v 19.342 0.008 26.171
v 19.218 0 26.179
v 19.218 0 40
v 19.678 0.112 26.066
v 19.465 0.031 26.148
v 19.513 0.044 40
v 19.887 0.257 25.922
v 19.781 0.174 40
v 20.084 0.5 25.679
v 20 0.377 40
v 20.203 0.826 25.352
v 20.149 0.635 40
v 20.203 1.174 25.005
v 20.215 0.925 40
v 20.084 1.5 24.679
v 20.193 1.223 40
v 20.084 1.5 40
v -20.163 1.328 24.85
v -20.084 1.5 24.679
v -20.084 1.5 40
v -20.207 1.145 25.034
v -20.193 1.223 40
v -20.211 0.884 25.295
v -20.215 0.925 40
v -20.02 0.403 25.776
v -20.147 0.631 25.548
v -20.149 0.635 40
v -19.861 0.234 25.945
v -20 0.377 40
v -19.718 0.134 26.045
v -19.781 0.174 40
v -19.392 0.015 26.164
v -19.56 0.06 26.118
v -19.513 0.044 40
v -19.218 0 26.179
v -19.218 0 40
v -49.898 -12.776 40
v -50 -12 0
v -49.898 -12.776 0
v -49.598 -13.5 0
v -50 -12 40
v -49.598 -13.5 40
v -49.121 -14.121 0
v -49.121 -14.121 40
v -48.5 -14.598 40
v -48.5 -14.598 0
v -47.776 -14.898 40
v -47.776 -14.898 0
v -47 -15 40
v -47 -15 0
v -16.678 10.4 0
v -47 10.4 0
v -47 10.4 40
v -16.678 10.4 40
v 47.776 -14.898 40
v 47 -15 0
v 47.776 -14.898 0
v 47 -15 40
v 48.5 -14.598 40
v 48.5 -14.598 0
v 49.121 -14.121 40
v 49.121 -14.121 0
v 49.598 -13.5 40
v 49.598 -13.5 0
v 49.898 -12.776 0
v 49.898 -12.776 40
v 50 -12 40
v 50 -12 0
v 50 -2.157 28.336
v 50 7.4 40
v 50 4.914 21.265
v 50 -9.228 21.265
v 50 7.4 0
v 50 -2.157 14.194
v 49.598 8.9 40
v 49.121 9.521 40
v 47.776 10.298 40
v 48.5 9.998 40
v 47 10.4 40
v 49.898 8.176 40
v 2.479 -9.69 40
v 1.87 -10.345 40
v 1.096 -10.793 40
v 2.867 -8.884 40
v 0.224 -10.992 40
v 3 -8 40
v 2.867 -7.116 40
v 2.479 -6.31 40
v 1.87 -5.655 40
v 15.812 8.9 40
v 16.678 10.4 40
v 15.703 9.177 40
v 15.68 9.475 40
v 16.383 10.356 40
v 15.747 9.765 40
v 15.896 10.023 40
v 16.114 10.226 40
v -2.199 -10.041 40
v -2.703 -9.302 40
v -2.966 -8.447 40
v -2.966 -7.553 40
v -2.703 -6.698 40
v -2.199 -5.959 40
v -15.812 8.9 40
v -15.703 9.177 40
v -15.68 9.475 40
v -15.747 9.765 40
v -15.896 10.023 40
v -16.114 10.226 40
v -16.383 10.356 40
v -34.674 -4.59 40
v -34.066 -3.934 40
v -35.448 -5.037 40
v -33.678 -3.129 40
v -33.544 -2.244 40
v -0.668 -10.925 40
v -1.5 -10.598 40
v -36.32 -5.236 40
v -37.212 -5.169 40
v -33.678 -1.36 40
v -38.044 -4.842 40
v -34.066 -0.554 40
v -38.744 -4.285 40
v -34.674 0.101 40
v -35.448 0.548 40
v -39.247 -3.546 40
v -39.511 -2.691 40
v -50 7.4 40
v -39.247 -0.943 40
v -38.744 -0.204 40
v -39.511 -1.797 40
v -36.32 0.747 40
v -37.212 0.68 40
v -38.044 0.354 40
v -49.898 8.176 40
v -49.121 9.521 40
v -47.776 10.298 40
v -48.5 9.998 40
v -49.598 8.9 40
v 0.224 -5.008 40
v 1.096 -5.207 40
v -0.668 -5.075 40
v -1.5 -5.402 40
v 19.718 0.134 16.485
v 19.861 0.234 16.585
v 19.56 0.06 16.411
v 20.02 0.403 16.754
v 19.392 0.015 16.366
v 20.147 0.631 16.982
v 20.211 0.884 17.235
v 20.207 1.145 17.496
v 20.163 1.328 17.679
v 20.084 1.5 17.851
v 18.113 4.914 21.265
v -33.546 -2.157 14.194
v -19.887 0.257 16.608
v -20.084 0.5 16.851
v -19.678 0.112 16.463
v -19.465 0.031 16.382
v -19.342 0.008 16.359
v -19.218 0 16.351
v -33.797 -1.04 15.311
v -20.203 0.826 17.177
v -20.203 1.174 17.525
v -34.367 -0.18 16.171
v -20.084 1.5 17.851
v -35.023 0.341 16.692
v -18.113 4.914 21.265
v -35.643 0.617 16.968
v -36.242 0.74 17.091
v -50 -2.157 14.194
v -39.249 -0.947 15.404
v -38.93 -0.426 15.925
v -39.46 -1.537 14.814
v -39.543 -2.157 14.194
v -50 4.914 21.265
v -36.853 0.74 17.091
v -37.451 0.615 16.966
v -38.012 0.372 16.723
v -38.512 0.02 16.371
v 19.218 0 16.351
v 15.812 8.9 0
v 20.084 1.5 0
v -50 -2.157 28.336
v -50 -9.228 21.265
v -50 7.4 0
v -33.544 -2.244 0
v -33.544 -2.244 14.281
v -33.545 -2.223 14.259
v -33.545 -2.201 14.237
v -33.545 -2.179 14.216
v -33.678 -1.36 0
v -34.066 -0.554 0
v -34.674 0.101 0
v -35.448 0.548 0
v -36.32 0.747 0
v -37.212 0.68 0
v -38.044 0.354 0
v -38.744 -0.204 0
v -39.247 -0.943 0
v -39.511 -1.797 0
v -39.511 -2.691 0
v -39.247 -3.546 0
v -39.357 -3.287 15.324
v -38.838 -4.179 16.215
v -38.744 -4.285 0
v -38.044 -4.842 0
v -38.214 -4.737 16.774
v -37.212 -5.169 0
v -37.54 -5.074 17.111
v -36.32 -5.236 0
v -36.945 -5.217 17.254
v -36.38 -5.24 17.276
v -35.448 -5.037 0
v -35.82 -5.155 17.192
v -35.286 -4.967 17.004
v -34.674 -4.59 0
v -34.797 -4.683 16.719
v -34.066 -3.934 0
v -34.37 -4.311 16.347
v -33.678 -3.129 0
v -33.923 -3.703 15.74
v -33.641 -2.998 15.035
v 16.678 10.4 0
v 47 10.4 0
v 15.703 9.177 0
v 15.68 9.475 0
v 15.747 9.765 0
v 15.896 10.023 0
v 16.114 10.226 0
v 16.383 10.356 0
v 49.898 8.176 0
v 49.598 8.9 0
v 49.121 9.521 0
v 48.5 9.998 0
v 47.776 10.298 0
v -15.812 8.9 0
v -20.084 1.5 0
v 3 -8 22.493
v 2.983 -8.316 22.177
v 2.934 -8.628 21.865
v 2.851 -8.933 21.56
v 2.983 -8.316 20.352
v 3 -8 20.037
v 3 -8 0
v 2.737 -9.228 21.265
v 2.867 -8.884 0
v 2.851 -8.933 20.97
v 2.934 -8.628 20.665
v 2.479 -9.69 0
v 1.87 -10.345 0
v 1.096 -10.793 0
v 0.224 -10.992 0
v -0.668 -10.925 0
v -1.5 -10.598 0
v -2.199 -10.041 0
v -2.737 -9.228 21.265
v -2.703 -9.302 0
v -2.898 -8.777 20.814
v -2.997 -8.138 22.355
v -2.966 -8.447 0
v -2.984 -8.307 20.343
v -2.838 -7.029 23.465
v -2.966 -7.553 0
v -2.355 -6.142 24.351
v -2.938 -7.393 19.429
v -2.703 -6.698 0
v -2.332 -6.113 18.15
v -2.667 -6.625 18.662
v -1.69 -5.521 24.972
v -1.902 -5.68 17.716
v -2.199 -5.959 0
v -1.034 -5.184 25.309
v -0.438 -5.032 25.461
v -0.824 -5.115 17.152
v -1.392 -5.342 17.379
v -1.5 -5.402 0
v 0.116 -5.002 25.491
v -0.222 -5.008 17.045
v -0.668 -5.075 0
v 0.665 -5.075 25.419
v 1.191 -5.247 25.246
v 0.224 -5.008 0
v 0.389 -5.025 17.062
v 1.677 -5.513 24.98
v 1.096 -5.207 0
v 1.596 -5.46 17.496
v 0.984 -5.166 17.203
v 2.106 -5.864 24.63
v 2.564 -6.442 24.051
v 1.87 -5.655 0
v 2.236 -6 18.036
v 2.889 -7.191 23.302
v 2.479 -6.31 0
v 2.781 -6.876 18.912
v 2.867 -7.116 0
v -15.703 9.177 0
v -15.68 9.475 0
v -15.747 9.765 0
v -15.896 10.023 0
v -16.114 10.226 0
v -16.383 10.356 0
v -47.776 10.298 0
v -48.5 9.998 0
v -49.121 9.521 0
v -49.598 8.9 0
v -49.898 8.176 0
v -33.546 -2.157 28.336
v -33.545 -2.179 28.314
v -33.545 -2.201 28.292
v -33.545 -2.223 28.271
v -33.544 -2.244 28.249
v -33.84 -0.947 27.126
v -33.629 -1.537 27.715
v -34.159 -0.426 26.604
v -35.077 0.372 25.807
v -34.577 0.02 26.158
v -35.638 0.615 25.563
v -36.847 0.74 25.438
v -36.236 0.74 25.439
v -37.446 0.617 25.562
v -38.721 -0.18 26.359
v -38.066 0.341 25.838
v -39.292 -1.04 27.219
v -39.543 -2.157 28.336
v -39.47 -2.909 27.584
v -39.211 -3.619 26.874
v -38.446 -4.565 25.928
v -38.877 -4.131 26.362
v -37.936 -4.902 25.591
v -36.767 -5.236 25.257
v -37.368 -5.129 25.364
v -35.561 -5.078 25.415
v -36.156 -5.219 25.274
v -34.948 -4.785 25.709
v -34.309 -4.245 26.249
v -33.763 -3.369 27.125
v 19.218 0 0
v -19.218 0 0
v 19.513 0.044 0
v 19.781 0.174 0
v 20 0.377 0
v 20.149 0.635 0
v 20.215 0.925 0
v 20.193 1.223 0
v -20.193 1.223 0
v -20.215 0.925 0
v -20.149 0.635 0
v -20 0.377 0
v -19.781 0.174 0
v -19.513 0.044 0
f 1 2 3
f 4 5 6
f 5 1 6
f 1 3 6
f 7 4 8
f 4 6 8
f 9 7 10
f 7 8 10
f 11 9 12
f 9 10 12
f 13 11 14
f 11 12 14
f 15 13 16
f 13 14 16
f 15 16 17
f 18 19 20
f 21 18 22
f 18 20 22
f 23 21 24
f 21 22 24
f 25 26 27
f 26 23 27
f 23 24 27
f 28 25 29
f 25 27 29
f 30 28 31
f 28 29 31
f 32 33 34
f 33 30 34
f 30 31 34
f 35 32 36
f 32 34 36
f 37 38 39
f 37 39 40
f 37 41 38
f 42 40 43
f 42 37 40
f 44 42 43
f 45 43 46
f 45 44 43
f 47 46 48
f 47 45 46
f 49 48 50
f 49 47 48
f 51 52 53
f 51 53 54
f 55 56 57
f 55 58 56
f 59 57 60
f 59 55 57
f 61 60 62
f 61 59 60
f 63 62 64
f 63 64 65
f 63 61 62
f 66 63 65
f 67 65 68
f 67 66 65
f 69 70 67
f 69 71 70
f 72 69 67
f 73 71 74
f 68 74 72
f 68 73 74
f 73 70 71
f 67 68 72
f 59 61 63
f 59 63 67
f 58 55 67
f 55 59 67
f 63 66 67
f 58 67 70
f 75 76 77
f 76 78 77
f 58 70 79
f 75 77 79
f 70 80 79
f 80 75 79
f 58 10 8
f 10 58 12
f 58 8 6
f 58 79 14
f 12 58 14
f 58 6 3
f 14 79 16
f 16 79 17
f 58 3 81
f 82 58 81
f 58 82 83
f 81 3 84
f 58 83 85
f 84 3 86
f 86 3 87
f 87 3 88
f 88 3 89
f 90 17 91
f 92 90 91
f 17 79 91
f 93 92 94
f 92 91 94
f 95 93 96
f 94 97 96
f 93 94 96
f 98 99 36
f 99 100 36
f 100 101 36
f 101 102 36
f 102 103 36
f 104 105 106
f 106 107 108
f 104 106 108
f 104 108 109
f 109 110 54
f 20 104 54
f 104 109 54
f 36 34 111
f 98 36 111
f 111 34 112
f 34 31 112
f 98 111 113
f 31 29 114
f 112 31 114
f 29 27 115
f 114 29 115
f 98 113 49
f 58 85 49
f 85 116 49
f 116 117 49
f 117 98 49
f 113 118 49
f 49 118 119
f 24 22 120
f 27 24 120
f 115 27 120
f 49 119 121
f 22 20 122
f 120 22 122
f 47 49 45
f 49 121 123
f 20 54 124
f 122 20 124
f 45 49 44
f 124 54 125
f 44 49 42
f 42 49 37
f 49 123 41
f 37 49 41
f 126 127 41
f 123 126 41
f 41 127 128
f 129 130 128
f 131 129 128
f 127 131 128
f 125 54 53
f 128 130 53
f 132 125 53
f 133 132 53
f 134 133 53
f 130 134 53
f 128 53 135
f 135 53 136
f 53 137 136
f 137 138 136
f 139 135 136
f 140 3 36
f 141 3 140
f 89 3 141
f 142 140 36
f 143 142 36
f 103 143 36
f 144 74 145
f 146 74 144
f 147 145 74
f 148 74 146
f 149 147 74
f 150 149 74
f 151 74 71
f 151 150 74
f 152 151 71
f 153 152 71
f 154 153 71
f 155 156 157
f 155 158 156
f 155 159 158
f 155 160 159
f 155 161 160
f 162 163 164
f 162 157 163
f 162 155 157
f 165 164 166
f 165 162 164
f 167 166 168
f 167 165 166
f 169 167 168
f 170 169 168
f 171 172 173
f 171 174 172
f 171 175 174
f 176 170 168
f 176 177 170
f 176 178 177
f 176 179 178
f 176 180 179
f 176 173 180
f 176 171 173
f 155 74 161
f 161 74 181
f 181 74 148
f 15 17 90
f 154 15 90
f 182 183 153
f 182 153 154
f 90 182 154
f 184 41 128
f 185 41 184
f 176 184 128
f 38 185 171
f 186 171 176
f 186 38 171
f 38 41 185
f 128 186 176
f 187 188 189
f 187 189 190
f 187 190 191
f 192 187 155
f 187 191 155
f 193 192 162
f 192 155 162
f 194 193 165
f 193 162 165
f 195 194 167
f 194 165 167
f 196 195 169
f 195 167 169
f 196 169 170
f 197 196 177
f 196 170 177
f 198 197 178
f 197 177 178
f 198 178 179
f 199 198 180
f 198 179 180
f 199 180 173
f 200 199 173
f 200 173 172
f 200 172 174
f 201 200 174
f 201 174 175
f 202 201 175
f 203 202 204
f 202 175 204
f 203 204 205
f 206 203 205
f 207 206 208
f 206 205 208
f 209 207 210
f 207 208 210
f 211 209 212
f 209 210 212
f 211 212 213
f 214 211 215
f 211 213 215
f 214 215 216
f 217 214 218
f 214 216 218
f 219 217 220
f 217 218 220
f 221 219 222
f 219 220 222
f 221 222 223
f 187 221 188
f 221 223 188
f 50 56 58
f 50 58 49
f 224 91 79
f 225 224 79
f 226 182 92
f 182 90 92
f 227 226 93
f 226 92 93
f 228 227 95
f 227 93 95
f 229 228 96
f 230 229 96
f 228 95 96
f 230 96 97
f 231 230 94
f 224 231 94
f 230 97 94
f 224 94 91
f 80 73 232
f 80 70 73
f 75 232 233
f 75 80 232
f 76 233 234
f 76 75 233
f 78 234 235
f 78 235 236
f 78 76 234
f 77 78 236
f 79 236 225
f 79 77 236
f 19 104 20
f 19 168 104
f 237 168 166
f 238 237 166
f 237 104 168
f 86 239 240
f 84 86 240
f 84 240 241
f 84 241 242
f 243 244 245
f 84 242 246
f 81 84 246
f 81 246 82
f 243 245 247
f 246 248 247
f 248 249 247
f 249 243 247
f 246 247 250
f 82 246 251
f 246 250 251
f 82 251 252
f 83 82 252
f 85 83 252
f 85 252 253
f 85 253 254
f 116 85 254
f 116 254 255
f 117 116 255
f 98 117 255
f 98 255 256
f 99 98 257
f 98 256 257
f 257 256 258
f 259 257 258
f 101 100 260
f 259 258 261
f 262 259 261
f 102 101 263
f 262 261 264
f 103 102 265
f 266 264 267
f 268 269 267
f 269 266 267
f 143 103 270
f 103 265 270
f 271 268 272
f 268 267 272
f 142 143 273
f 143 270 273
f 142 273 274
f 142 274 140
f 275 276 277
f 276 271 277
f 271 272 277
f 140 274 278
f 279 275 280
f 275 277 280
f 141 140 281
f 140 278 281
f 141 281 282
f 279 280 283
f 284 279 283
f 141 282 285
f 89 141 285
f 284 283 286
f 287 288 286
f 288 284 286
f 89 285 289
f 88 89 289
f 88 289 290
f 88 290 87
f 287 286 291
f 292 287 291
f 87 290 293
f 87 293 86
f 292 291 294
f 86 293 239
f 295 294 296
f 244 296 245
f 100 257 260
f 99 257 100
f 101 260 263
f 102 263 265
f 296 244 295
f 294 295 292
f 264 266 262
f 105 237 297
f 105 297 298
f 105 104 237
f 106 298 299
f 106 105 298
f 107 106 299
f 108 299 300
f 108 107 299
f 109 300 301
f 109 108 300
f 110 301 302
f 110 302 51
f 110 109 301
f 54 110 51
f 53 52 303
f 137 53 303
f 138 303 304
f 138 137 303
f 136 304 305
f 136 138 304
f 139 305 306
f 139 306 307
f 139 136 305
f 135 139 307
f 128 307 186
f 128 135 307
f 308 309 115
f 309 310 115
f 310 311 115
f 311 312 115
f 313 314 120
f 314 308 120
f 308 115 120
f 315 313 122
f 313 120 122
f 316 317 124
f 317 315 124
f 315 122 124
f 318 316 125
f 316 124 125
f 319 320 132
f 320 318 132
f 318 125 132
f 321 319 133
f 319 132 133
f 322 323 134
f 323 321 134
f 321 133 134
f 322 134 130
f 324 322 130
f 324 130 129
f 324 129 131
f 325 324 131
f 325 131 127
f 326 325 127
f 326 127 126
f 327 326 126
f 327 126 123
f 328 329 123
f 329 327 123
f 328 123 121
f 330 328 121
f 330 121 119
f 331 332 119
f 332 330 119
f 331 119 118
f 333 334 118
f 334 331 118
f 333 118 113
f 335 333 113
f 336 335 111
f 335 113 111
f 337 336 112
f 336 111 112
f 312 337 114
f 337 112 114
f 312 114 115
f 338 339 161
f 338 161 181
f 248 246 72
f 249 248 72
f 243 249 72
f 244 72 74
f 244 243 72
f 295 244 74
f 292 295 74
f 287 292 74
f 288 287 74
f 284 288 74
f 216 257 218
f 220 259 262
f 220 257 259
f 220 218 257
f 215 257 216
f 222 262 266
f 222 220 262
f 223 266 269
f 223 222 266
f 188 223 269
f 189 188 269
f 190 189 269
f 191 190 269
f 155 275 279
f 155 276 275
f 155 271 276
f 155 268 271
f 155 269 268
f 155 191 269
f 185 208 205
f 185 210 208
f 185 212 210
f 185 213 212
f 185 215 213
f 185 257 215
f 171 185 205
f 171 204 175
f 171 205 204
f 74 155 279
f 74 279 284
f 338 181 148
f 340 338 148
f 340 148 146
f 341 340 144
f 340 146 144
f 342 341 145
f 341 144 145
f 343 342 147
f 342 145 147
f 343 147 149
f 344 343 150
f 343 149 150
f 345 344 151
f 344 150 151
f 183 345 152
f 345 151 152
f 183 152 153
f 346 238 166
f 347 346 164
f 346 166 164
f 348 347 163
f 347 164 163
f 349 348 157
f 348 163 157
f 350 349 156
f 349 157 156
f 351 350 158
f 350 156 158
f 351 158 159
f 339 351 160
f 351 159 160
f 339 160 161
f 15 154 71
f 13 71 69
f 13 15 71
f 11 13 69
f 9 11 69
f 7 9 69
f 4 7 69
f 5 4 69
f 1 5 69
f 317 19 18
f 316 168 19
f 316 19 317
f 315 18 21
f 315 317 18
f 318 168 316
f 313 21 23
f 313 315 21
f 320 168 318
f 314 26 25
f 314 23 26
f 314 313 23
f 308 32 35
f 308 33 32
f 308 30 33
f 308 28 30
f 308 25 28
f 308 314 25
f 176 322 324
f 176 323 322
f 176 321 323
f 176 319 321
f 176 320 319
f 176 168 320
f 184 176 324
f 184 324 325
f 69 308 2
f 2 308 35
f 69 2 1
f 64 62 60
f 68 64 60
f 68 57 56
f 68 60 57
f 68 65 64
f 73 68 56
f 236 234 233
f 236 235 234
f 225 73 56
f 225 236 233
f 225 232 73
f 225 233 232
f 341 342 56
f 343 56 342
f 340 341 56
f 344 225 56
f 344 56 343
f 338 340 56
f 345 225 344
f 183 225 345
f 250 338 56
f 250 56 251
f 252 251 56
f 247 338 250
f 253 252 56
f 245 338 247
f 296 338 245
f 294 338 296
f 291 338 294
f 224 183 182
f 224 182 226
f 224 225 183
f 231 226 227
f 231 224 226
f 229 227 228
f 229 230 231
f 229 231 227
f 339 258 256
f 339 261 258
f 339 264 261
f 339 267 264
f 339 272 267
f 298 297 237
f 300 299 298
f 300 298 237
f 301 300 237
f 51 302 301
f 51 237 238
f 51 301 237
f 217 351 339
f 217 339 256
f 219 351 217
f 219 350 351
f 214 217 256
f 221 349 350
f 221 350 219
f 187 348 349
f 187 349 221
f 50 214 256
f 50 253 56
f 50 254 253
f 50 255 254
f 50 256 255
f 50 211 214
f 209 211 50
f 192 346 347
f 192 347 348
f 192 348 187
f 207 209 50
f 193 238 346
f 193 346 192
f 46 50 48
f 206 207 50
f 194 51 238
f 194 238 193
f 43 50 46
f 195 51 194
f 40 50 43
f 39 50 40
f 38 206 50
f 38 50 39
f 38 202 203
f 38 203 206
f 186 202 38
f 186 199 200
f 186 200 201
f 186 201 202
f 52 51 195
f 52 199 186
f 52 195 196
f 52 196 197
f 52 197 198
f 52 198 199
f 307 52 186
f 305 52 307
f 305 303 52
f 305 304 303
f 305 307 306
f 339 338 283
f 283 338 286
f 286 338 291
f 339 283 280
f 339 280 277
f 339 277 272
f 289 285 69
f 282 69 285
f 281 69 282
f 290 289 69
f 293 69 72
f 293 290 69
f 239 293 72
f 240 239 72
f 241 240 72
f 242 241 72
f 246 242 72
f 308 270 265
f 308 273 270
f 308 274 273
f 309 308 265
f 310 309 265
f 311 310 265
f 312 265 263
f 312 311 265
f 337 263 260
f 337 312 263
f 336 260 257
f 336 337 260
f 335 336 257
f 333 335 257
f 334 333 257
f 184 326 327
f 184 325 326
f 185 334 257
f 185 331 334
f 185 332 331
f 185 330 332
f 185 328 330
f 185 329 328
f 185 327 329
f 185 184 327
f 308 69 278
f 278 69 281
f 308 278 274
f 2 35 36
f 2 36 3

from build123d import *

# Parameters (mm, degrees)
PAD_DEPTH       = 40
FILLET_R        = 1
FILLET001_R     = 3
SKETCH001_R     = 3
POCKET_DEPTH    = 40.001
POCKET001_DEPTH = 100.001
SKETCH004_R     = 3
POCKET002_DEPTH = 40.001


with BuildPart() as part:
    # Sketch → Pad (new body)
    with BuildSketch(Plane.XY):
        Polygon((-14.945557, 10.4), (-20.95, 0), (20.95, 0), (14.945557, 10.4), (50, 10.4), (50, -15), (-50, -15), (-50, 10.4), align=None)
    extrude(amount=PAD_DEPTH)

    # Fillet
    fillet_edges = [part.edges().sort_by_distance(p)[0] for p in [
        (20.95, 0, 20),
        (-20.95, 0, 20),
        (-14.945557, 10.4, 20),
        (14.945557, 10.4, 20),
    ]]
    fillet(fillet_edges, radius=FILLET_R)

    # Fillet001
    fillet001_edges = [part.edges().sort_by_distance(p)[0] for p in [
        (-50, 10.4, 20),
        (50, 10.4, 20),
        (50, -15, 20),
        (-50, -15, 20),
    ]]
    fillet(fillet001_edges, radius=FILLET001_R)

    # Sketch001 → Pocket (cut, through all)
    with BuildSketch(Plane(origin=(0, 0, 0), x_dir=(1, 0, 0), z_dir=(0, 0, -1))):
        with Locations((0, 8)):
            Circle(SKETCH001_R)
    extrude(amount=-POCKET_DEPTH, mode=Mode.SUBTRACT)

    # Sketch002 → Pocket001 (cut, through all)
    with BuildSketch(Plane(origin=(-50, 0, 0), x_dir=(0, -1, 0), z_dir=(-1, 0, 0))):
        Polygon((2.157222, 14.193818), (-4.913846, 21.264885), (2.157222, 28.335953), (9.22829, 21.264885), align=None)
    extrude(amount=-POCKET001_DEPTH, mode=Mode.SUBTRACT)

    # Sketch004 → Pocket002 (cut, through all)
    with BuildSketch(Plane.XY.offset(40)):
        with Locations((-36.544449, -2.244335)):
            Circle(SKETCH004_R)
    extrude(amount=-POCKET002_DEPTH, mode=Mode.SUBTRACT)


solid = part.part
